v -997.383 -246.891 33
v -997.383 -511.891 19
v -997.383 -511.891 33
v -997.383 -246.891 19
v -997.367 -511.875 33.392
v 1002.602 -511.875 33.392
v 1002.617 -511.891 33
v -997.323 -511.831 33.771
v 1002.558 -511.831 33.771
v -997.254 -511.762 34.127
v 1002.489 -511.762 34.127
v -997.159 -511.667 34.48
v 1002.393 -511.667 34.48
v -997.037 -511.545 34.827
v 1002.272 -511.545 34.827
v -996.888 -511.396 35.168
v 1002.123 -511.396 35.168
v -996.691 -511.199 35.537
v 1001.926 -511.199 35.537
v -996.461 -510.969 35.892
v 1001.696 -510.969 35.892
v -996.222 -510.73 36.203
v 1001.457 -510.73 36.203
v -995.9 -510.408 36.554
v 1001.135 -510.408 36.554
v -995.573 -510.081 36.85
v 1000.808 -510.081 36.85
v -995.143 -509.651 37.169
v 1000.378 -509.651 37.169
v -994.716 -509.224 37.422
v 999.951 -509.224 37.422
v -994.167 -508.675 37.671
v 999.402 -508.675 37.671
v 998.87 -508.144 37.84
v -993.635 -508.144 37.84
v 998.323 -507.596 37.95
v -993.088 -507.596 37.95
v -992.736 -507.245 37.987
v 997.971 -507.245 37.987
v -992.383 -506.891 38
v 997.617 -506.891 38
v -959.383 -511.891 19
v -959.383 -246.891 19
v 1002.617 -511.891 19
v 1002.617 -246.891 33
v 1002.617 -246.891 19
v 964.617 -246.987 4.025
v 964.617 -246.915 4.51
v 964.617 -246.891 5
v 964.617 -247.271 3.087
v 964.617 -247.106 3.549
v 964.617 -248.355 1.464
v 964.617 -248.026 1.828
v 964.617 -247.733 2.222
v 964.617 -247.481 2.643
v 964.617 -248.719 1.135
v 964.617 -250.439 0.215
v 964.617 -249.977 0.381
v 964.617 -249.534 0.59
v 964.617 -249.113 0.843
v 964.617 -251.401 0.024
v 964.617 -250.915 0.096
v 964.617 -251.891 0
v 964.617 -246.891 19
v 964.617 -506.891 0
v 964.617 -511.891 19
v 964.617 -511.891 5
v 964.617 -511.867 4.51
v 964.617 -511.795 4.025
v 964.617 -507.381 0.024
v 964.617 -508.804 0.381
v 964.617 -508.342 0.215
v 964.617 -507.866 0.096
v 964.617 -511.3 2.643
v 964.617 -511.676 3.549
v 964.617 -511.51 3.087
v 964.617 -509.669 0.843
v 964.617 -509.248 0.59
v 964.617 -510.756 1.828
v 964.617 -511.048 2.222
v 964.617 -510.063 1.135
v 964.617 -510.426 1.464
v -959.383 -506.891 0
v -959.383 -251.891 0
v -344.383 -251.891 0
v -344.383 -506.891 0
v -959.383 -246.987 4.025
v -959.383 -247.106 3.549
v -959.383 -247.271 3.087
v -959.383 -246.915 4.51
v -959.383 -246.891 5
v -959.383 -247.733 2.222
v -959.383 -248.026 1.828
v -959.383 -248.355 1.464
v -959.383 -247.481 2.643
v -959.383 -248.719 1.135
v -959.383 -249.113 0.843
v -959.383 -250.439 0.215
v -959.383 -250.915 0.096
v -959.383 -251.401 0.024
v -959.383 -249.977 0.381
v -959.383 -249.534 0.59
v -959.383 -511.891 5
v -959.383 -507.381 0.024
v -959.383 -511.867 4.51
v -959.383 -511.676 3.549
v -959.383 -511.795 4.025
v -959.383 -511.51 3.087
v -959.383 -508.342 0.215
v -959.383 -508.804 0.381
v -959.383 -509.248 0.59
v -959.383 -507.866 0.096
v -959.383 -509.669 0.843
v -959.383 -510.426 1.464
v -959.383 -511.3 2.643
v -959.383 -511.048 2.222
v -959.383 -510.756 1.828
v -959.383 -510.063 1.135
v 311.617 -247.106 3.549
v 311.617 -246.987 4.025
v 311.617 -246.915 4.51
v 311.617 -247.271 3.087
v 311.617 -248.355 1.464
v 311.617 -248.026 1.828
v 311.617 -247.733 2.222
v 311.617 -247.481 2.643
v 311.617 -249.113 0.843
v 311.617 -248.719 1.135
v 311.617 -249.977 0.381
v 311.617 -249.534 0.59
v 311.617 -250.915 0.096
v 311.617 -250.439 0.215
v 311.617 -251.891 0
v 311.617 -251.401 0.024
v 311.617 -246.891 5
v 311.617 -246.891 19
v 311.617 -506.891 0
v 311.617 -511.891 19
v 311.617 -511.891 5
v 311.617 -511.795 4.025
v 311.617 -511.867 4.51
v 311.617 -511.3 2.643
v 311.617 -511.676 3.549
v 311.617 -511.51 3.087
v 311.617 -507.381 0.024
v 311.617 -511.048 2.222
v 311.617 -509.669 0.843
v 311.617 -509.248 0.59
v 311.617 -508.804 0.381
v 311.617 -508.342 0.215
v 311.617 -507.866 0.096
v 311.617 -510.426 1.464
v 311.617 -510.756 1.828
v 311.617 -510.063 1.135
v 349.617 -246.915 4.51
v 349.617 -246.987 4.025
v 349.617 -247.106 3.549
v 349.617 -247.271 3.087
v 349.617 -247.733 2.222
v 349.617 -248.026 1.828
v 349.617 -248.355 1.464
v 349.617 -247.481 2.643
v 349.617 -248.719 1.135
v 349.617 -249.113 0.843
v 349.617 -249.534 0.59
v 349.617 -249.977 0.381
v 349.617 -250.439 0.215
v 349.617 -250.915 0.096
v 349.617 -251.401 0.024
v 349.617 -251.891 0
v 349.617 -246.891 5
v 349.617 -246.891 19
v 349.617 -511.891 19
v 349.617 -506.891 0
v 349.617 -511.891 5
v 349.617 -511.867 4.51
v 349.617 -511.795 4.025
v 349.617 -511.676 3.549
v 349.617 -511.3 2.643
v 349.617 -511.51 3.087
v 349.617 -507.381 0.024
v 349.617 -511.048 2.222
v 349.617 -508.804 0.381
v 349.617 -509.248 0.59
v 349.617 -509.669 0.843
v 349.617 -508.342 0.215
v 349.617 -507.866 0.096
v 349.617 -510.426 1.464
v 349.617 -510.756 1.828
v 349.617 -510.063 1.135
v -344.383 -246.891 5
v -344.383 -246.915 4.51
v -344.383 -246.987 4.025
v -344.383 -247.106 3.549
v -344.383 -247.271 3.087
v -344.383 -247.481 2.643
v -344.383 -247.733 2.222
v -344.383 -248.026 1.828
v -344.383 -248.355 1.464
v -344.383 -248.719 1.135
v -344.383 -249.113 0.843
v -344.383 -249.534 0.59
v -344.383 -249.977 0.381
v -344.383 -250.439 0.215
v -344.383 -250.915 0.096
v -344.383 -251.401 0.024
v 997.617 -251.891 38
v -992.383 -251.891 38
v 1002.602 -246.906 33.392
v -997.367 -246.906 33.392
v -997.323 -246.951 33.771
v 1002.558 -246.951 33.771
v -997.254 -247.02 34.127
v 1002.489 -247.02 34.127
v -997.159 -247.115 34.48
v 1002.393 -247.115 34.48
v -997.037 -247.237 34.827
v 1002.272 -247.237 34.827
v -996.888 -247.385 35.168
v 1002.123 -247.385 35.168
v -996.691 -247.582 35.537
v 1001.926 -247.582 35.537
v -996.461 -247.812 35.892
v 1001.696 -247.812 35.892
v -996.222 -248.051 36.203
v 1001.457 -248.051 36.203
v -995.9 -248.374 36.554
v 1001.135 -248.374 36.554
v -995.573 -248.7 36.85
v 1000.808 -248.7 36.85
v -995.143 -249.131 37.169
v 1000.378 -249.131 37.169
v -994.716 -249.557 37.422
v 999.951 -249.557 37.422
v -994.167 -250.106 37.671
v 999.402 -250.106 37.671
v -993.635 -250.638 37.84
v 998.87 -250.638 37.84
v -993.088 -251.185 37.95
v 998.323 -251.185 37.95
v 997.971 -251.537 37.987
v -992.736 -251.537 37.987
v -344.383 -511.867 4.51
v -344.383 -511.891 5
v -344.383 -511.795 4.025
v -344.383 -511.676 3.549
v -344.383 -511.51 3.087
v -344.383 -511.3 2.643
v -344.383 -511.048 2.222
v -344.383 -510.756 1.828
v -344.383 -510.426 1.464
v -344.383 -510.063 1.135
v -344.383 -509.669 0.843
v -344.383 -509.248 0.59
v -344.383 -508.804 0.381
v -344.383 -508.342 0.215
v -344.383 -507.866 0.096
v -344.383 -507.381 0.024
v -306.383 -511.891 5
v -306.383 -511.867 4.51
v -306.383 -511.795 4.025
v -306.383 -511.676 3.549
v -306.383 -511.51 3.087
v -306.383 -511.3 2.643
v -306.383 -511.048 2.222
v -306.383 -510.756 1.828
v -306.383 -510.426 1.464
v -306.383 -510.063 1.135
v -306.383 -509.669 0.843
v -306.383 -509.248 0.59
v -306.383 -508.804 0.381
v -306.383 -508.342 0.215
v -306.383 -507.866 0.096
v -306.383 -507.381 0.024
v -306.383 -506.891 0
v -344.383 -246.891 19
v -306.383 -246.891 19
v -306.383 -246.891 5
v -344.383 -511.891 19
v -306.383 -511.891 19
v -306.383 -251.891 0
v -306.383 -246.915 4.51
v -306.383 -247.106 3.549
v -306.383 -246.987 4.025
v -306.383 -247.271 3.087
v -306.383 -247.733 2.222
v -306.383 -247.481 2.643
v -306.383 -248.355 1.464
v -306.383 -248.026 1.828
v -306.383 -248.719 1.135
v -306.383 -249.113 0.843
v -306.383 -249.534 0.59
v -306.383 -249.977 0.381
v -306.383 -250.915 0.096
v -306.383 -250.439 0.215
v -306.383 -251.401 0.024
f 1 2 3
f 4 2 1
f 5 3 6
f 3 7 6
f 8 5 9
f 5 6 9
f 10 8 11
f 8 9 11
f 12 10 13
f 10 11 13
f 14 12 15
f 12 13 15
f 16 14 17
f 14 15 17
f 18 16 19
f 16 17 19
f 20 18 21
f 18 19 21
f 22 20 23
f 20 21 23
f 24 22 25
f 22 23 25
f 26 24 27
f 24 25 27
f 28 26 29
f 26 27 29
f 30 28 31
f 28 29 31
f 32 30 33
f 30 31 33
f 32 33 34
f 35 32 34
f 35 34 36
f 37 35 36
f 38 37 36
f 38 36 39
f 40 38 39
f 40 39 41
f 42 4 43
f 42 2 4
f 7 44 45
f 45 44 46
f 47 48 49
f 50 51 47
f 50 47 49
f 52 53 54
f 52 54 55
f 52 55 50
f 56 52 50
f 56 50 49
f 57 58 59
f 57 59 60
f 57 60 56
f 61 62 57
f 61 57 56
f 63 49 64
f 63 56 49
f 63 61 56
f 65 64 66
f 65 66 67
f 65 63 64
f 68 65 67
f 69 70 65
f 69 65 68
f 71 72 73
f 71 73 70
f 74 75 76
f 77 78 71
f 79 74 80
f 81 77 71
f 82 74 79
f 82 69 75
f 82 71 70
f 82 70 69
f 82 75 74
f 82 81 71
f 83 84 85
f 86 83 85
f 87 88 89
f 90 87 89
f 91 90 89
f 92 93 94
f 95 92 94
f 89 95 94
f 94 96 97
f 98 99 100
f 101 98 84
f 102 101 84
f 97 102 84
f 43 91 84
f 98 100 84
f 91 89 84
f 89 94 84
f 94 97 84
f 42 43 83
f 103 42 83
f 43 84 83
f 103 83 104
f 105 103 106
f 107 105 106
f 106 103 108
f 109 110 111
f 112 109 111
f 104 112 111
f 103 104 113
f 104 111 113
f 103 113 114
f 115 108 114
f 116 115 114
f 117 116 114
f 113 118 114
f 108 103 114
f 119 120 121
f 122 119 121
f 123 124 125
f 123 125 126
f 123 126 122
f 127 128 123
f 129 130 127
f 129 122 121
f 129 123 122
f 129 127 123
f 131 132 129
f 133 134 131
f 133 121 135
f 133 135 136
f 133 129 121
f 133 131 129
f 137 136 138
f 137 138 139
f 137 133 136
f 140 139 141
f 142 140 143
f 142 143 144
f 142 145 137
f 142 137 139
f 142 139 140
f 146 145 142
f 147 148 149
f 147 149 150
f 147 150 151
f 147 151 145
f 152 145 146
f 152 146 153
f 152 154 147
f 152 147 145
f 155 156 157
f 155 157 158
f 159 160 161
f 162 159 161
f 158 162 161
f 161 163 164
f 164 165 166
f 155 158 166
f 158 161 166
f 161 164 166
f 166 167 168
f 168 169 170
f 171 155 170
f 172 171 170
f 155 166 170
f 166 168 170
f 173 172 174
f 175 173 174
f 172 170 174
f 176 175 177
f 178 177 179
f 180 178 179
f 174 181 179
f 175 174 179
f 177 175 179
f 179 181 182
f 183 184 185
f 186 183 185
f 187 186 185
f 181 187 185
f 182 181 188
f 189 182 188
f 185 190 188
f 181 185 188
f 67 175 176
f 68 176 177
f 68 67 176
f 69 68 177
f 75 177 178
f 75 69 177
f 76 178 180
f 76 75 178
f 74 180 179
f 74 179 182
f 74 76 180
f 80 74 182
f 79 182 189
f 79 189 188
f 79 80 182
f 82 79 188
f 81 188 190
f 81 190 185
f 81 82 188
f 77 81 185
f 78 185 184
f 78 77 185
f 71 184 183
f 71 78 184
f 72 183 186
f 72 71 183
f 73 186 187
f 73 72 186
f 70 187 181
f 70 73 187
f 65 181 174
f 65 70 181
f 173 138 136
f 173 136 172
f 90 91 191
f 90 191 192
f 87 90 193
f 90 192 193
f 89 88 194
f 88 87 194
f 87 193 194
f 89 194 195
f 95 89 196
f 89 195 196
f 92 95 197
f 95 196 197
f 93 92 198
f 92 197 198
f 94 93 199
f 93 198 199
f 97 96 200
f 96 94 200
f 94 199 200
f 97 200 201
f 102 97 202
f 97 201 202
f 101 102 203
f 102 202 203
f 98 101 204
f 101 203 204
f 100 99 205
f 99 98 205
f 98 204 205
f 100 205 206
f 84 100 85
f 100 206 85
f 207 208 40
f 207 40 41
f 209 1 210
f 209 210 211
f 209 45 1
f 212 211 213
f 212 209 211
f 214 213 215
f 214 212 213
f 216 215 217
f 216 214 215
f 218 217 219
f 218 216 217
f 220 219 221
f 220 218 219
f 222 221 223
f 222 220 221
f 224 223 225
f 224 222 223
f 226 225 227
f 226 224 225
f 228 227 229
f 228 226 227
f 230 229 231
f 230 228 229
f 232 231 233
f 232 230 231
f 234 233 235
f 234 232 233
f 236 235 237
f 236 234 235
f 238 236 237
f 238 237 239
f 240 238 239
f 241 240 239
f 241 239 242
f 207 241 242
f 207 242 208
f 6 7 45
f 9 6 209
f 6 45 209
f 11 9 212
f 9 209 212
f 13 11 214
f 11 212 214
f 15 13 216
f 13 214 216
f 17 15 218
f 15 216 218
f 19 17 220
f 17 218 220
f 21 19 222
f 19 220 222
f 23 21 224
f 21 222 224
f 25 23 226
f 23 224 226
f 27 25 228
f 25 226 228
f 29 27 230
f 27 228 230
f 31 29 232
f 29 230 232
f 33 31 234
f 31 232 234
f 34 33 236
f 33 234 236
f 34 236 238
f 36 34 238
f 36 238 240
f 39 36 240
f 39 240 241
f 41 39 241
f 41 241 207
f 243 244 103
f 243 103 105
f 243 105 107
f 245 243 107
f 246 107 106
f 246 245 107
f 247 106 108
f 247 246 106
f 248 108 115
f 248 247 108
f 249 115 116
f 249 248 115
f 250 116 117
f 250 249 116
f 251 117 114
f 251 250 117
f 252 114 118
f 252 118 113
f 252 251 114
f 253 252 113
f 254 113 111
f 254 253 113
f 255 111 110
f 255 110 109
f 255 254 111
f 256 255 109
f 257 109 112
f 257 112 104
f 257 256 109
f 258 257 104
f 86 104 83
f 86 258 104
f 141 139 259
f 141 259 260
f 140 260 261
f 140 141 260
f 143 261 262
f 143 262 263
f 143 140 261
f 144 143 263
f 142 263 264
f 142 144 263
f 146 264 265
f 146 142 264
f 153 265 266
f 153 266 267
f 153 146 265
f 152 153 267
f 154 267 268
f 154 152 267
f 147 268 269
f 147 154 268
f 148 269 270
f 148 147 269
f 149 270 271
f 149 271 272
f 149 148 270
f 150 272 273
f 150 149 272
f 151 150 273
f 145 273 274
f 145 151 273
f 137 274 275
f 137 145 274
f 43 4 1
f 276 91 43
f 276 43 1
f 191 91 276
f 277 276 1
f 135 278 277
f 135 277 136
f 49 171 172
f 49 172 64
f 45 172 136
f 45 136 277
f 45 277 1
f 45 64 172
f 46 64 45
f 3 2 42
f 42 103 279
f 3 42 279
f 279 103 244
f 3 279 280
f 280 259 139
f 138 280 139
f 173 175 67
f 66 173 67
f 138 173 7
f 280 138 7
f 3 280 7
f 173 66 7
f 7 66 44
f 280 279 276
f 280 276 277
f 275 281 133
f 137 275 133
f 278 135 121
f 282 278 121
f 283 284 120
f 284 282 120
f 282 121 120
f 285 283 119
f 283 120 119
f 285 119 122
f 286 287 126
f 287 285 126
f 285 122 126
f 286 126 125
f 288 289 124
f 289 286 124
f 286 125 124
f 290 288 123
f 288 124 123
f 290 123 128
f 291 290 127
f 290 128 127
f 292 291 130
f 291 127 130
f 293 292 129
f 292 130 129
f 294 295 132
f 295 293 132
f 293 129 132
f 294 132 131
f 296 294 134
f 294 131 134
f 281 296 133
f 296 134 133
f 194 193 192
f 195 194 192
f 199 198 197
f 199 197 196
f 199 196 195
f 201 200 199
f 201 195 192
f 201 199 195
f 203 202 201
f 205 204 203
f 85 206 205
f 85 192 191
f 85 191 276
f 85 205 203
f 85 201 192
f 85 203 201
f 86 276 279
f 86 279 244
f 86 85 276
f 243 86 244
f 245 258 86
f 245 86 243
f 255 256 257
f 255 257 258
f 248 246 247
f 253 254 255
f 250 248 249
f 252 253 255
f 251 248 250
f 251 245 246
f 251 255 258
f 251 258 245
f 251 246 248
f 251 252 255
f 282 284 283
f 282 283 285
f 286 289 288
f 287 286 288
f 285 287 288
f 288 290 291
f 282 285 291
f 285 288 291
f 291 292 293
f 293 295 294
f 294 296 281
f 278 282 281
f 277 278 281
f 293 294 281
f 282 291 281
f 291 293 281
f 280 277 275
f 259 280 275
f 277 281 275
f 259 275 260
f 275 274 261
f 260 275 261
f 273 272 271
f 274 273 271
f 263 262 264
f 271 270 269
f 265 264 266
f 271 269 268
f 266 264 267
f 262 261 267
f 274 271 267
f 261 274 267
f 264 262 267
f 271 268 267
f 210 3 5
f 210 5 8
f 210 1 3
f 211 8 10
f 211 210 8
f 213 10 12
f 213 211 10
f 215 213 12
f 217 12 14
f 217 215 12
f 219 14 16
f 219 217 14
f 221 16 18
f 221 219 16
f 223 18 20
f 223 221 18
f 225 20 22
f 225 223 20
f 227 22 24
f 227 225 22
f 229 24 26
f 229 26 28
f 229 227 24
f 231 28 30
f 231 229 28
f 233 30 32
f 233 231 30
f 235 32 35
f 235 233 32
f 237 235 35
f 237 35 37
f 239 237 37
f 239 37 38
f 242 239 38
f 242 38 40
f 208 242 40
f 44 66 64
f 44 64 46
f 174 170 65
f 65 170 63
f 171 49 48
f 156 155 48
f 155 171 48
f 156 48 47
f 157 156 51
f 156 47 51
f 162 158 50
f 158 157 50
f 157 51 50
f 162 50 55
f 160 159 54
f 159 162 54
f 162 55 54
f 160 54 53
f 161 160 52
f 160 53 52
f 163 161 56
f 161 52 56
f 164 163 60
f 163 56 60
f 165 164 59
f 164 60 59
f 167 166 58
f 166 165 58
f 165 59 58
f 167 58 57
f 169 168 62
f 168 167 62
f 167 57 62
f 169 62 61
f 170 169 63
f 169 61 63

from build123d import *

# Parameters (mm, degrees)
F0_W     = 2000
F0_H     = 265
F1_DEPTH = 38
F2_R     = 5
F3_W     = 44.824789
F3_H     = 380.666598
F3_W_2   = 70.77609
F3_H_2   = 364.249266
F4_DEPTH = 19
F5_W     = 38
F5_H     = 342.808559
F5_H_2   = 434.554458
F6_DEPTH = 19


with BuildPart() as f1:
    # F0 (on Top) → F1 (new body)
    with BuildSketch(Plane.XY):
        with Locations((2.617415, -379.390822)):
            Rectangle(F0_W, F0_H)
    extrude(amount=F1_DEPTH)

    # F2
    f2_edges = [f1.edges().sort_by_distance(p)[0] for p in [
        (2.617415, -246.890822, 38),
        (-997.382585, -379.390822, 38),
        (2.617415, -511.890822, 38),
        (1002.617415, -379.390822, 38),
        (2.617415, -246.890822, 0),
        (-997.382585, -379.390822, 0),
        (2.617415, -511.890822, 0),
        (1002.617415, -379.390822, 0),
    ]]
    fillet(f2_edges, radius=F2_R)

    # F3 (on face) → F4 (cut)
    with BuildSketch(Plane(origin=(0, 0, 0), x_dir=(1, 0, 0), z_dir=(0, 0, -1))):
        with Locations((-981.794979, 384.322472)):
            Rectangle(F3_W, F3_H)
        with Locations((1000.00546, 386.361368)):
            Rectangle(F3_W_2, F3_H_2)
    extrude(amount=-F4_DEPTH, mode=Mode.SUBTRACT)

    # F5 (on face) → F6 (cut)
    with BuildSketch(Plane(origin=(0, 0, 0), x_dir=(1, 0, 0), z_dir=(0, 0, -1))):
        with Locations((-325.382585, 353.463552)):
            Rectangle(F5_W, F5_H)
        with Locations((330.617415, 355.673134)):
            Rectangle(F5_W, F5_H_2)
    extrude(amount=-F6_DEPTH, mode=Mode.SUBTRACT)


solid = f1.part
